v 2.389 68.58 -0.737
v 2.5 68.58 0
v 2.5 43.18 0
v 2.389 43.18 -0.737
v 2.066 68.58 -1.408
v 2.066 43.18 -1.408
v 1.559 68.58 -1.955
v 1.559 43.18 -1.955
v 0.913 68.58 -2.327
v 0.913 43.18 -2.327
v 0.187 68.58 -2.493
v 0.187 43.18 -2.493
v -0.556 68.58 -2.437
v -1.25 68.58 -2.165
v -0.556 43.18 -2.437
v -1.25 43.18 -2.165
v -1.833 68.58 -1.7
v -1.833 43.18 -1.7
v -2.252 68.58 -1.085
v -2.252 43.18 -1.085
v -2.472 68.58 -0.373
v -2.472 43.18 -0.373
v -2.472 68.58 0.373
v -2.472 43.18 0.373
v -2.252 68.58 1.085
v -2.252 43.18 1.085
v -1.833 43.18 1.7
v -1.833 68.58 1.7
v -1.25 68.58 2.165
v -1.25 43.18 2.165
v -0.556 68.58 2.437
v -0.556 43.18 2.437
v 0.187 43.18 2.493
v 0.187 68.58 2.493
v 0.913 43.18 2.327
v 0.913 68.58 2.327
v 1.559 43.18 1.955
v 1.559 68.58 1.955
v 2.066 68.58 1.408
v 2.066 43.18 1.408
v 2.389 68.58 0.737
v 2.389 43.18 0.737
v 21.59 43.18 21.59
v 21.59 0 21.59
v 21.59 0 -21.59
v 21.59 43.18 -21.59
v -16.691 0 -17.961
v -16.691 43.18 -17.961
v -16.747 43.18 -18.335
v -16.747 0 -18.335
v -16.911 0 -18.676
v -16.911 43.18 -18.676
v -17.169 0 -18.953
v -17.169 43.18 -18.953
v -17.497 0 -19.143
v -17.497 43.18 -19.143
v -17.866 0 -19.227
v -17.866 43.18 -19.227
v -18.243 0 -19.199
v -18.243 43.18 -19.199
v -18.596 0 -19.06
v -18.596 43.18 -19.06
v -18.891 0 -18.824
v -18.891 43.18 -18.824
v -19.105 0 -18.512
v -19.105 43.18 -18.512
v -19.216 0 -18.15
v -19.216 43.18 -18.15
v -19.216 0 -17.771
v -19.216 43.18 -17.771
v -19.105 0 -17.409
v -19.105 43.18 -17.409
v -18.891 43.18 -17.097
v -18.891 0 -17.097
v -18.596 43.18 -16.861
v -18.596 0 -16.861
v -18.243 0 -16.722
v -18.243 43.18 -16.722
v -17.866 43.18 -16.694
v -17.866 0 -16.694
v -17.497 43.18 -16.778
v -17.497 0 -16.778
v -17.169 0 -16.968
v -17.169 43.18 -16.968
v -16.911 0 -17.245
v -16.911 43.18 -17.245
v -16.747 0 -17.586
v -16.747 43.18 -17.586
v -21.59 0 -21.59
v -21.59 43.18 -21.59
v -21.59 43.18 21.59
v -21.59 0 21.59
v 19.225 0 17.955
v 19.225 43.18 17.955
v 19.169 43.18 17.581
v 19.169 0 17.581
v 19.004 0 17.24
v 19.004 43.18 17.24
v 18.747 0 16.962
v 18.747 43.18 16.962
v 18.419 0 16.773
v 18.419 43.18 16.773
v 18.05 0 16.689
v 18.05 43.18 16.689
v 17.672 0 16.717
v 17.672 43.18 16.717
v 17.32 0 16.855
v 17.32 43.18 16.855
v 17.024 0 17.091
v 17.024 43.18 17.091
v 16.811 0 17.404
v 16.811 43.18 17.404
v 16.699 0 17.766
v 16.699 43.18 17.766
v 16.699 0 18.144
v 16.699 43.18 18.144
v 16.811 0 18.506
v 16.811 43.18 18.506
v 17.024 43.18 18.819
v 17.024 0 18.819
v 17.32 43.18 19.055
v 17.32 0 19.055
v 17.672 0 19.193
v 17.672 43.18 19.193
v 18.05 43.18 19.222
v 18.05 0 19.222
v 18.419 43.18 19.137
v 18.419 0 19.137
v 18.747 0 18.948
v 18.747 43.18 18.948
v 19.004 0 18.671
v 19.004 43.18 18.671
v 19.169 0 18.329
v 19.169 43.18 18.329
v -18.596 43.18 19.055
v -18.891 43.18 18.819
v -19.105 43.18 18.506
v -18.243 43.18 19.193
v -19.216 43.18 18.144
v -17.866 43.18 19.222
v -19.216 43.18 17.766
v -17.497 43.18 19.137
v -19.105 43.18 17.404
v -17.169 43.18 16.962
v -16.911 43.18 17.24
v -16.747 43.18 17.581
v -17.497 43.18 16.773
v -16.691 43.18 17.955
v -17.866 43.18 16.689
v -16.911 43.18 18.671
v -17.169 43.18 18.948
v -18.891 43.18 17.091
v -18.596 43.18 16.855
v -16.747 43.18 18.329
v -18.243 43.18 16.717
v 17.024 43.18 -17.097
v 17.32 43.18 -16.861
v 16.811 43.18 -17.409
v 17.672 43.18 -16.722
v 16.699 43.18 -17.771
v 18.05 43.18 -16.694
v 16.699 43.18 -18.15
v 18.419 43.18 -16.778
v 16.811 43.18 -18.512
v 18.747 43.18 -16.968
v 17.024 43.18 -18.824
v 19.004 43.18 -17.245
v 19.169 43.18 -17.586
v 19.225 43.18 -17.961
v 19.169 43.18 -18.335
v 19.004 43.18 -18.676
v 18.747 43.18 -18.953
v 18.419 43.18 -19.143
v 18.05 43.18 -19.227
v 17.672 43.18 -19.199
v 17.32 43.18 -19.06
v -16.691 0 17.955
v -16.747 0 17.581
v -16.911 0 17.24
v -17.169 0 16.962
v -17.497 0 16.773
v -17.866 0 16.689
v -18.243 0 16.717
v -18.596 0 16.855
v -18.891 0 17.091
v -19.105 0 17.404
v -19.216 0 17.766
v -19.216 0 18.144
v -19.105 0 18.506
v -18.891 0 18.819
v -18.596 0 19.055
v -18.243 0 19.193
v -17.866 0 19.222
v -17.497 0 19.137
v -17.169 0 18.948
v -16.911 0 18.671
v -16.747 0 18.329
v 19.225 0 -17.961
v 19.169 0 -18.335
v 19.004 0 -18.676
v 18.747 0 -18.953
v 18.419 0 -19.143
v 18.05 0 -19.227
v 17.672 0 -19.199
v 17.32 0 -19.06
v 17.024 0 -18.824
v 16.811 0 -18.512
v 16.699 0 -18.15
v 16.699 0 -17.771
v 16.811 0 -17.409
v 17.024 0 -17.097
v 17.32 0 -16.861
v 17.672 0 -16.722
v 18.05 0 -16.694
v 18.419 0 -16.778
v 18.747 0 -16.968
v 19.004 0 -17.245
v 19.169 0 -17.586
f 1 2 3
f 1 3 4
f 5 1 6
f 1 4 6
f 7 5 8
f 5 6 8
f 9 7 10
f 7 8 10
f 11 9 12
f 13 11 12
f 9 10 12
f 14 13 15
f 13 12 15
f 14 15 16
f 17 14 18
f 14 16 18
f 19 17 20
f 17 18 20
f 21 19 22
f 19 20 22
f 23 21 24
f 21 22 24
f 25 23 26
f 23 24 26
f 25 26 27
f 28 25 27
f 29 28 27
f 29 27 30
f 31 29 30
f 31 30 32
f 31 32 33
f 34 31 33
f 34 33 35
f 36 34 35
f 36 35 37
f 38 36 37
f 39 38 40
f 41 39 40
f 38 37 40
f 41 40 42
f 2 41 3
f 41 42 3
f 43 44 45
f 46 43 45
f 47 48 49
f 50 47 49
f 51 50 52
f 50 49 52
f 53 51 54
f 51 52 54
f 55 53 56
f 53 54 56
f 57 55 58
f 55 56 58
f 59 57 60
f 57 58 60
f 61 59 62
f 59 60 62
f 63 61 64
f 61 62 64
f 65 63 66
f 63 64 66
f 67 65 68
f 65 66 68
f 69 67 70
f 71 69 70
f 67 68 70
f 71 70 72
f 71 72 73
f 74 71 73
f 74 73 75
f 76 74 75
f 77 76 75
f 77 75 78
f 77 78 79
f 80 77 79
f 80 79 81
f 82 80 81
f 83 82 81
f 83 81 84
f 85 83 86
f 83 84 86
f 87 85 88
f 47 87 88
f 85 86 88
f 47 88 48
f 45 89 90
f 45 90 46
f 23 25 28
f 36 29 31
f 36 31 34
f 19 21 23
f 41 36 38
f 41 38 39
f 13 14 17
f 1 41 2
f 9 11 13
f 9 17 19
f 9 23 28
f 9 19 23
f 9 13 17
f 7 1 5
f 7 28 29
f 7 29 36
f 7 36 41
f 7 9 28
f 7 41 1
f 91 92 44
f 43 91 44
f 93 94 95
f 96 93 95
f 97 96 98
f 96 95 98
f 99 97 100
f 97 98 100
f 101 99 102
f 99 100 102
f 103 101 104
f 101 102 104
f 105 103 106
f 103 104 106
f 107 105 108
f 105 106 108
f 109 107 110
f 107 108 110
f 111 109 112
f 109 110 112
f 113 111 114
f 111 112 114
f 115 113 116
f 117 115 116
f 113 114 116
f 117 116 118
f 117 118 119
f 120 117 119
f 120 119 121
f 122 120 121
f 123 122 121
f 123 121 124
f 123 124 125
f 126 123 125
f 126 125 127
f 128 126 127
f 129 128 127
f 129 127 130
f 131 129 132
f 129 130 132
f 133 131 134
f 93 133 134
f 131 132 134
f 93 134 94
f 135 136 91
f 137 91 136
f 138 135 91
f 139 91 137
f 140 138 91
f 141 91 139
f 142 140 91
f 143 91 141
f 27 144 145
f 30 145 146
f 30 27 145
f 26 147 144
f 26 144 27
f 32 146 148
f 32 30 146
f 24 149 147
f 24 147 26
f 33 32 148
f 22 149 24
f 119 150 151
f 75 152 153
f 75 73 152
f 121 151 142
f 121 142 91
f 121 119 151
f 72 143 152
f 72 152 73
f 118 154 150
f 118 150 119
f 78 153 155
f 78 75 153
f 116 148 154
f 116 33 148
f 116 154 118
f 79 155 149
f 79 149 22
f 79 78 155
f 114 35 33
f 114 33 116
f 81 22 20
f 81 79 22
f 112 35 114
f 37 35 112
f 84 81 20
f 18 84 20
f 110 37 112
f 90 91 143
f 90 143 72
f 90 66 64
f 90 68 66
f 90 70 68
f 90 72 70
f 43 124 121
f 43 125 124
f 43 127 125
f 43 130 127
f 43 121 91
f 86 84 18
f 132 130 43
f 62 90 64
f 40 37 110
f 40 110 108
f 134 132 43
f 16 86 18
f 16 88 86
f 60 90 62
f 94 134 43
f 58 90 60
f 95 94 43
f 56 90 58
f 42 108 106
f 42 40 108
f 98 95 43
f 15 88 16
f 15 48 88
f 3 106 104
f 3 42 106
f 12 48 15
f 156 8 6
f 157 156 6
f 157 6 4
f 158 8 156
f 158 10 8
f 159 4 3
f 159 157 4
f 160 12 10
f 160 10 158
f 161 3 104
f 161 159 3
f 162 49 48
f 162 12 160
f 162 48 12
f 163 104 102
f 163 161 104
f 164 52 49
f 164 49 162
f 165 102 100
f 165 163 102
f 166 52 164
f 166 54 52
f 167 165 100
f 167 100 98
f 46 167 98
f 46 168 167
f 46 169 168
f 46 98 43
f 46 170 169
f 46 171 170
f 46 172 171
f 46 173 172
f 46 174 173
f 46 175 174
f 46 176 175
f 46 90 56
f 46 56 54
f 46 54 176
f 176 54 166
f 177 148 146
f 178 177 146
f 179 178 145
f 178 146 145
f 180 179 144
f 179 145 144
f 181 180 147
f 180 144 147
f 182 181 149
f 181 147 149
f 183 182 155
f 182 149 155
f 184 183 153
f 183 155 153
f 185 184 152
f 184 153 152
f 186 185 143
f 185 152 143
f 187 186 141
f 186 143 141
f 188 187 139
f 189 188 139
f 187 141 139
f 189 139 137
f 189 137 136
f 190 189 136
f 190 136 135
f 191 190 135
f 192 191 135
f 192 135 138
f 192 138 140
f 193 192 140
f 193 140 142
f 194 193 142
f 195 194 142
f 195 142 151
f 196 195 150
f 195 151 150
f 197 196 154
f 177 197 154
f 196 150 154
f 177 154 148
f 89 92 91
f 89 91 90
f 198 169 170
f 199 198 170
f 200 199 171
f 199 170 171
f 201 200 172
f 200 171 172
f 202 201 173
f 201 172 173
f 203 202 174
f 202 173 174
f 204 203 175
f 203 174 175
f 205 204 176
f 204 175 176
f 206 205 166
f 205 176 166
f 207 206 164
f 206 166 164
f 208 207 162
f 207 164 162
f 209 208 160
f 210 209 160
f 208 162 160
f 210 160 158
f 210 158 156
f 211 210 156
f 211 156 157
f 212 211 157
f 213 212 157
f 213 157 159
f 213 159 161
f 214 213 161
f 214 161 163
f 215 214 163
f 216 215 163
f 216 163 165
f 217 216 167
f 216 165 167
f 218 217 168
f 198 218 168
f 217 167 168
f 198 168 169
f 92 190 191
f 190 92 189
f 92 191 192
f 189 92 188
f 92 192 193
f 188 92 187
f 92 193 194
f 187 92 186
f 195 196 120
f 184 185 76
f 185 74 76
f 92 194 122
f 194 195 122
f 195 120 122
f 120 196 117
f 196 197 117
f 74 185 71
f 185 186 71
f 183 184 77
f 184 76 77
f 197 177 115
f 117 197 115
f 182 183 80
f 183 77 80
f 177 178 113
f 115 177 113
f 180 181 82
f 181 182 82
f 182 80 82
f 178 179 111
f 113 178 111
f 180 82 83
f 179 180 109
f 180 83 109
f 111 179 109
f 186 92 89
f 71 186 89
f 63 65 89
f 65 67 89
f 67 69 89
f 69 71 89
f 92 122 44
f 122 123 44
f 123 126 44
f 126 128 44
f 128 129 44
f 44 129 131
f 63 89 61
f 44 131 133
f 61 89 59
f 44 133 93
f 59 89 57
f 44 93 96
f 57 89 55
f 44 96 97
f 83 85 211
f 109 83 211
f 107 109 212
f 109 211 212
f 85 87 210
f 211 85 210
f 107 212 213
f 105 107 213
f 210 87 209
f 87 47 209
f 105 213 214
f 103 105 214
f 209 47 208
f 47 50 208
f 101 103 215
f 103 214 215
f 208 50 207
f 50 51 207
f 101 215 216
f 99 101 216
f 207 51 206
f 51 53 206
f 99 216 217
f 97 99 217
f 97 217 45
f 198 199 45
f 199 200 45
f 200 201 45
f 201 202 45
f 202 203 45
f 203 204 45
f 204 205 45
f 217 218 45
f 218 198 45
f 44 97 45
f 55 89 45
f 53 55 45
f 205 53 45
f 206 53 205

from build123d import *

# Parameters (mm, degrees)
SKETCH1_W            = 43.18
SKETCH1_H            = 43.18
BOSS_EXTRUDE1_DEPTH  = 43.18
SKETCH2_R            = 2.5
BOSS_EXTRUDE2_DEPTH  = 25.4
SKETCH3_R            = 1.27
CUT_EXTRUDE1_DEPTH   = 43.18
LPATTERN1_COUNT      = 2
LPATTERN1_PITCH      = 35.9156
LPATTERN1_COUNT_DIR2 = 2
LPATTERN1_PITCH_DIR2 = 35.9156


with BuildPart() as part:
    # Sketch1 → Boss-Extrude1 (new body)
    with BuildSketch(Plane(origin=(0, 0, 0), x_dir=(1, 0, 0), z_dir=(0, 1, 0))):
        Rectangle(SKETCH1_W, SKETCH1_H)
    extrude(amount=BOSS_EXTRUDE1_DEPTH)

    # Sketch2 → Boss-Extrude2 (add)
    with BuildSketch(Plane(origin=(0, 43.18, 0), x_dir=(1, 0, 0), z_dir=(0, 1, 0))):
        Circle(SKETCH2_R)
    extrude(amount=BOSS_EXTRUDE2_DEPTH)

    # Sketch3 → Cut-Extrude1 (cut)
    with BuildSketch(Plane(origin=(0, 43.18, 0), x_dir=(1, 0, 0), z_dir=(0, 1, 0))):
        with Locations((-17.960512242, 17.960512242)):
            Circle(SKETCH3_R)
    cut_extrude1 = extrude(amount=-CUT_EXTRUDE1_DEPTH, mode=Mode.SUBTRACT)

    # LPattern1: Cut-Extrude1 2 × 2
    with Locations(*[(i * LPATTERN1_PITCH, 0, j * LPATTERN1_PITCH_DIR2) for i in range(LPATTERN1_COUNT) for j in range(LPATTERN1_COUNT_DIR2) if (i, j) != (0, 0)]):
        add(cut_extrude1, mode=Mode.SUBTRACT)


solid = part.part
